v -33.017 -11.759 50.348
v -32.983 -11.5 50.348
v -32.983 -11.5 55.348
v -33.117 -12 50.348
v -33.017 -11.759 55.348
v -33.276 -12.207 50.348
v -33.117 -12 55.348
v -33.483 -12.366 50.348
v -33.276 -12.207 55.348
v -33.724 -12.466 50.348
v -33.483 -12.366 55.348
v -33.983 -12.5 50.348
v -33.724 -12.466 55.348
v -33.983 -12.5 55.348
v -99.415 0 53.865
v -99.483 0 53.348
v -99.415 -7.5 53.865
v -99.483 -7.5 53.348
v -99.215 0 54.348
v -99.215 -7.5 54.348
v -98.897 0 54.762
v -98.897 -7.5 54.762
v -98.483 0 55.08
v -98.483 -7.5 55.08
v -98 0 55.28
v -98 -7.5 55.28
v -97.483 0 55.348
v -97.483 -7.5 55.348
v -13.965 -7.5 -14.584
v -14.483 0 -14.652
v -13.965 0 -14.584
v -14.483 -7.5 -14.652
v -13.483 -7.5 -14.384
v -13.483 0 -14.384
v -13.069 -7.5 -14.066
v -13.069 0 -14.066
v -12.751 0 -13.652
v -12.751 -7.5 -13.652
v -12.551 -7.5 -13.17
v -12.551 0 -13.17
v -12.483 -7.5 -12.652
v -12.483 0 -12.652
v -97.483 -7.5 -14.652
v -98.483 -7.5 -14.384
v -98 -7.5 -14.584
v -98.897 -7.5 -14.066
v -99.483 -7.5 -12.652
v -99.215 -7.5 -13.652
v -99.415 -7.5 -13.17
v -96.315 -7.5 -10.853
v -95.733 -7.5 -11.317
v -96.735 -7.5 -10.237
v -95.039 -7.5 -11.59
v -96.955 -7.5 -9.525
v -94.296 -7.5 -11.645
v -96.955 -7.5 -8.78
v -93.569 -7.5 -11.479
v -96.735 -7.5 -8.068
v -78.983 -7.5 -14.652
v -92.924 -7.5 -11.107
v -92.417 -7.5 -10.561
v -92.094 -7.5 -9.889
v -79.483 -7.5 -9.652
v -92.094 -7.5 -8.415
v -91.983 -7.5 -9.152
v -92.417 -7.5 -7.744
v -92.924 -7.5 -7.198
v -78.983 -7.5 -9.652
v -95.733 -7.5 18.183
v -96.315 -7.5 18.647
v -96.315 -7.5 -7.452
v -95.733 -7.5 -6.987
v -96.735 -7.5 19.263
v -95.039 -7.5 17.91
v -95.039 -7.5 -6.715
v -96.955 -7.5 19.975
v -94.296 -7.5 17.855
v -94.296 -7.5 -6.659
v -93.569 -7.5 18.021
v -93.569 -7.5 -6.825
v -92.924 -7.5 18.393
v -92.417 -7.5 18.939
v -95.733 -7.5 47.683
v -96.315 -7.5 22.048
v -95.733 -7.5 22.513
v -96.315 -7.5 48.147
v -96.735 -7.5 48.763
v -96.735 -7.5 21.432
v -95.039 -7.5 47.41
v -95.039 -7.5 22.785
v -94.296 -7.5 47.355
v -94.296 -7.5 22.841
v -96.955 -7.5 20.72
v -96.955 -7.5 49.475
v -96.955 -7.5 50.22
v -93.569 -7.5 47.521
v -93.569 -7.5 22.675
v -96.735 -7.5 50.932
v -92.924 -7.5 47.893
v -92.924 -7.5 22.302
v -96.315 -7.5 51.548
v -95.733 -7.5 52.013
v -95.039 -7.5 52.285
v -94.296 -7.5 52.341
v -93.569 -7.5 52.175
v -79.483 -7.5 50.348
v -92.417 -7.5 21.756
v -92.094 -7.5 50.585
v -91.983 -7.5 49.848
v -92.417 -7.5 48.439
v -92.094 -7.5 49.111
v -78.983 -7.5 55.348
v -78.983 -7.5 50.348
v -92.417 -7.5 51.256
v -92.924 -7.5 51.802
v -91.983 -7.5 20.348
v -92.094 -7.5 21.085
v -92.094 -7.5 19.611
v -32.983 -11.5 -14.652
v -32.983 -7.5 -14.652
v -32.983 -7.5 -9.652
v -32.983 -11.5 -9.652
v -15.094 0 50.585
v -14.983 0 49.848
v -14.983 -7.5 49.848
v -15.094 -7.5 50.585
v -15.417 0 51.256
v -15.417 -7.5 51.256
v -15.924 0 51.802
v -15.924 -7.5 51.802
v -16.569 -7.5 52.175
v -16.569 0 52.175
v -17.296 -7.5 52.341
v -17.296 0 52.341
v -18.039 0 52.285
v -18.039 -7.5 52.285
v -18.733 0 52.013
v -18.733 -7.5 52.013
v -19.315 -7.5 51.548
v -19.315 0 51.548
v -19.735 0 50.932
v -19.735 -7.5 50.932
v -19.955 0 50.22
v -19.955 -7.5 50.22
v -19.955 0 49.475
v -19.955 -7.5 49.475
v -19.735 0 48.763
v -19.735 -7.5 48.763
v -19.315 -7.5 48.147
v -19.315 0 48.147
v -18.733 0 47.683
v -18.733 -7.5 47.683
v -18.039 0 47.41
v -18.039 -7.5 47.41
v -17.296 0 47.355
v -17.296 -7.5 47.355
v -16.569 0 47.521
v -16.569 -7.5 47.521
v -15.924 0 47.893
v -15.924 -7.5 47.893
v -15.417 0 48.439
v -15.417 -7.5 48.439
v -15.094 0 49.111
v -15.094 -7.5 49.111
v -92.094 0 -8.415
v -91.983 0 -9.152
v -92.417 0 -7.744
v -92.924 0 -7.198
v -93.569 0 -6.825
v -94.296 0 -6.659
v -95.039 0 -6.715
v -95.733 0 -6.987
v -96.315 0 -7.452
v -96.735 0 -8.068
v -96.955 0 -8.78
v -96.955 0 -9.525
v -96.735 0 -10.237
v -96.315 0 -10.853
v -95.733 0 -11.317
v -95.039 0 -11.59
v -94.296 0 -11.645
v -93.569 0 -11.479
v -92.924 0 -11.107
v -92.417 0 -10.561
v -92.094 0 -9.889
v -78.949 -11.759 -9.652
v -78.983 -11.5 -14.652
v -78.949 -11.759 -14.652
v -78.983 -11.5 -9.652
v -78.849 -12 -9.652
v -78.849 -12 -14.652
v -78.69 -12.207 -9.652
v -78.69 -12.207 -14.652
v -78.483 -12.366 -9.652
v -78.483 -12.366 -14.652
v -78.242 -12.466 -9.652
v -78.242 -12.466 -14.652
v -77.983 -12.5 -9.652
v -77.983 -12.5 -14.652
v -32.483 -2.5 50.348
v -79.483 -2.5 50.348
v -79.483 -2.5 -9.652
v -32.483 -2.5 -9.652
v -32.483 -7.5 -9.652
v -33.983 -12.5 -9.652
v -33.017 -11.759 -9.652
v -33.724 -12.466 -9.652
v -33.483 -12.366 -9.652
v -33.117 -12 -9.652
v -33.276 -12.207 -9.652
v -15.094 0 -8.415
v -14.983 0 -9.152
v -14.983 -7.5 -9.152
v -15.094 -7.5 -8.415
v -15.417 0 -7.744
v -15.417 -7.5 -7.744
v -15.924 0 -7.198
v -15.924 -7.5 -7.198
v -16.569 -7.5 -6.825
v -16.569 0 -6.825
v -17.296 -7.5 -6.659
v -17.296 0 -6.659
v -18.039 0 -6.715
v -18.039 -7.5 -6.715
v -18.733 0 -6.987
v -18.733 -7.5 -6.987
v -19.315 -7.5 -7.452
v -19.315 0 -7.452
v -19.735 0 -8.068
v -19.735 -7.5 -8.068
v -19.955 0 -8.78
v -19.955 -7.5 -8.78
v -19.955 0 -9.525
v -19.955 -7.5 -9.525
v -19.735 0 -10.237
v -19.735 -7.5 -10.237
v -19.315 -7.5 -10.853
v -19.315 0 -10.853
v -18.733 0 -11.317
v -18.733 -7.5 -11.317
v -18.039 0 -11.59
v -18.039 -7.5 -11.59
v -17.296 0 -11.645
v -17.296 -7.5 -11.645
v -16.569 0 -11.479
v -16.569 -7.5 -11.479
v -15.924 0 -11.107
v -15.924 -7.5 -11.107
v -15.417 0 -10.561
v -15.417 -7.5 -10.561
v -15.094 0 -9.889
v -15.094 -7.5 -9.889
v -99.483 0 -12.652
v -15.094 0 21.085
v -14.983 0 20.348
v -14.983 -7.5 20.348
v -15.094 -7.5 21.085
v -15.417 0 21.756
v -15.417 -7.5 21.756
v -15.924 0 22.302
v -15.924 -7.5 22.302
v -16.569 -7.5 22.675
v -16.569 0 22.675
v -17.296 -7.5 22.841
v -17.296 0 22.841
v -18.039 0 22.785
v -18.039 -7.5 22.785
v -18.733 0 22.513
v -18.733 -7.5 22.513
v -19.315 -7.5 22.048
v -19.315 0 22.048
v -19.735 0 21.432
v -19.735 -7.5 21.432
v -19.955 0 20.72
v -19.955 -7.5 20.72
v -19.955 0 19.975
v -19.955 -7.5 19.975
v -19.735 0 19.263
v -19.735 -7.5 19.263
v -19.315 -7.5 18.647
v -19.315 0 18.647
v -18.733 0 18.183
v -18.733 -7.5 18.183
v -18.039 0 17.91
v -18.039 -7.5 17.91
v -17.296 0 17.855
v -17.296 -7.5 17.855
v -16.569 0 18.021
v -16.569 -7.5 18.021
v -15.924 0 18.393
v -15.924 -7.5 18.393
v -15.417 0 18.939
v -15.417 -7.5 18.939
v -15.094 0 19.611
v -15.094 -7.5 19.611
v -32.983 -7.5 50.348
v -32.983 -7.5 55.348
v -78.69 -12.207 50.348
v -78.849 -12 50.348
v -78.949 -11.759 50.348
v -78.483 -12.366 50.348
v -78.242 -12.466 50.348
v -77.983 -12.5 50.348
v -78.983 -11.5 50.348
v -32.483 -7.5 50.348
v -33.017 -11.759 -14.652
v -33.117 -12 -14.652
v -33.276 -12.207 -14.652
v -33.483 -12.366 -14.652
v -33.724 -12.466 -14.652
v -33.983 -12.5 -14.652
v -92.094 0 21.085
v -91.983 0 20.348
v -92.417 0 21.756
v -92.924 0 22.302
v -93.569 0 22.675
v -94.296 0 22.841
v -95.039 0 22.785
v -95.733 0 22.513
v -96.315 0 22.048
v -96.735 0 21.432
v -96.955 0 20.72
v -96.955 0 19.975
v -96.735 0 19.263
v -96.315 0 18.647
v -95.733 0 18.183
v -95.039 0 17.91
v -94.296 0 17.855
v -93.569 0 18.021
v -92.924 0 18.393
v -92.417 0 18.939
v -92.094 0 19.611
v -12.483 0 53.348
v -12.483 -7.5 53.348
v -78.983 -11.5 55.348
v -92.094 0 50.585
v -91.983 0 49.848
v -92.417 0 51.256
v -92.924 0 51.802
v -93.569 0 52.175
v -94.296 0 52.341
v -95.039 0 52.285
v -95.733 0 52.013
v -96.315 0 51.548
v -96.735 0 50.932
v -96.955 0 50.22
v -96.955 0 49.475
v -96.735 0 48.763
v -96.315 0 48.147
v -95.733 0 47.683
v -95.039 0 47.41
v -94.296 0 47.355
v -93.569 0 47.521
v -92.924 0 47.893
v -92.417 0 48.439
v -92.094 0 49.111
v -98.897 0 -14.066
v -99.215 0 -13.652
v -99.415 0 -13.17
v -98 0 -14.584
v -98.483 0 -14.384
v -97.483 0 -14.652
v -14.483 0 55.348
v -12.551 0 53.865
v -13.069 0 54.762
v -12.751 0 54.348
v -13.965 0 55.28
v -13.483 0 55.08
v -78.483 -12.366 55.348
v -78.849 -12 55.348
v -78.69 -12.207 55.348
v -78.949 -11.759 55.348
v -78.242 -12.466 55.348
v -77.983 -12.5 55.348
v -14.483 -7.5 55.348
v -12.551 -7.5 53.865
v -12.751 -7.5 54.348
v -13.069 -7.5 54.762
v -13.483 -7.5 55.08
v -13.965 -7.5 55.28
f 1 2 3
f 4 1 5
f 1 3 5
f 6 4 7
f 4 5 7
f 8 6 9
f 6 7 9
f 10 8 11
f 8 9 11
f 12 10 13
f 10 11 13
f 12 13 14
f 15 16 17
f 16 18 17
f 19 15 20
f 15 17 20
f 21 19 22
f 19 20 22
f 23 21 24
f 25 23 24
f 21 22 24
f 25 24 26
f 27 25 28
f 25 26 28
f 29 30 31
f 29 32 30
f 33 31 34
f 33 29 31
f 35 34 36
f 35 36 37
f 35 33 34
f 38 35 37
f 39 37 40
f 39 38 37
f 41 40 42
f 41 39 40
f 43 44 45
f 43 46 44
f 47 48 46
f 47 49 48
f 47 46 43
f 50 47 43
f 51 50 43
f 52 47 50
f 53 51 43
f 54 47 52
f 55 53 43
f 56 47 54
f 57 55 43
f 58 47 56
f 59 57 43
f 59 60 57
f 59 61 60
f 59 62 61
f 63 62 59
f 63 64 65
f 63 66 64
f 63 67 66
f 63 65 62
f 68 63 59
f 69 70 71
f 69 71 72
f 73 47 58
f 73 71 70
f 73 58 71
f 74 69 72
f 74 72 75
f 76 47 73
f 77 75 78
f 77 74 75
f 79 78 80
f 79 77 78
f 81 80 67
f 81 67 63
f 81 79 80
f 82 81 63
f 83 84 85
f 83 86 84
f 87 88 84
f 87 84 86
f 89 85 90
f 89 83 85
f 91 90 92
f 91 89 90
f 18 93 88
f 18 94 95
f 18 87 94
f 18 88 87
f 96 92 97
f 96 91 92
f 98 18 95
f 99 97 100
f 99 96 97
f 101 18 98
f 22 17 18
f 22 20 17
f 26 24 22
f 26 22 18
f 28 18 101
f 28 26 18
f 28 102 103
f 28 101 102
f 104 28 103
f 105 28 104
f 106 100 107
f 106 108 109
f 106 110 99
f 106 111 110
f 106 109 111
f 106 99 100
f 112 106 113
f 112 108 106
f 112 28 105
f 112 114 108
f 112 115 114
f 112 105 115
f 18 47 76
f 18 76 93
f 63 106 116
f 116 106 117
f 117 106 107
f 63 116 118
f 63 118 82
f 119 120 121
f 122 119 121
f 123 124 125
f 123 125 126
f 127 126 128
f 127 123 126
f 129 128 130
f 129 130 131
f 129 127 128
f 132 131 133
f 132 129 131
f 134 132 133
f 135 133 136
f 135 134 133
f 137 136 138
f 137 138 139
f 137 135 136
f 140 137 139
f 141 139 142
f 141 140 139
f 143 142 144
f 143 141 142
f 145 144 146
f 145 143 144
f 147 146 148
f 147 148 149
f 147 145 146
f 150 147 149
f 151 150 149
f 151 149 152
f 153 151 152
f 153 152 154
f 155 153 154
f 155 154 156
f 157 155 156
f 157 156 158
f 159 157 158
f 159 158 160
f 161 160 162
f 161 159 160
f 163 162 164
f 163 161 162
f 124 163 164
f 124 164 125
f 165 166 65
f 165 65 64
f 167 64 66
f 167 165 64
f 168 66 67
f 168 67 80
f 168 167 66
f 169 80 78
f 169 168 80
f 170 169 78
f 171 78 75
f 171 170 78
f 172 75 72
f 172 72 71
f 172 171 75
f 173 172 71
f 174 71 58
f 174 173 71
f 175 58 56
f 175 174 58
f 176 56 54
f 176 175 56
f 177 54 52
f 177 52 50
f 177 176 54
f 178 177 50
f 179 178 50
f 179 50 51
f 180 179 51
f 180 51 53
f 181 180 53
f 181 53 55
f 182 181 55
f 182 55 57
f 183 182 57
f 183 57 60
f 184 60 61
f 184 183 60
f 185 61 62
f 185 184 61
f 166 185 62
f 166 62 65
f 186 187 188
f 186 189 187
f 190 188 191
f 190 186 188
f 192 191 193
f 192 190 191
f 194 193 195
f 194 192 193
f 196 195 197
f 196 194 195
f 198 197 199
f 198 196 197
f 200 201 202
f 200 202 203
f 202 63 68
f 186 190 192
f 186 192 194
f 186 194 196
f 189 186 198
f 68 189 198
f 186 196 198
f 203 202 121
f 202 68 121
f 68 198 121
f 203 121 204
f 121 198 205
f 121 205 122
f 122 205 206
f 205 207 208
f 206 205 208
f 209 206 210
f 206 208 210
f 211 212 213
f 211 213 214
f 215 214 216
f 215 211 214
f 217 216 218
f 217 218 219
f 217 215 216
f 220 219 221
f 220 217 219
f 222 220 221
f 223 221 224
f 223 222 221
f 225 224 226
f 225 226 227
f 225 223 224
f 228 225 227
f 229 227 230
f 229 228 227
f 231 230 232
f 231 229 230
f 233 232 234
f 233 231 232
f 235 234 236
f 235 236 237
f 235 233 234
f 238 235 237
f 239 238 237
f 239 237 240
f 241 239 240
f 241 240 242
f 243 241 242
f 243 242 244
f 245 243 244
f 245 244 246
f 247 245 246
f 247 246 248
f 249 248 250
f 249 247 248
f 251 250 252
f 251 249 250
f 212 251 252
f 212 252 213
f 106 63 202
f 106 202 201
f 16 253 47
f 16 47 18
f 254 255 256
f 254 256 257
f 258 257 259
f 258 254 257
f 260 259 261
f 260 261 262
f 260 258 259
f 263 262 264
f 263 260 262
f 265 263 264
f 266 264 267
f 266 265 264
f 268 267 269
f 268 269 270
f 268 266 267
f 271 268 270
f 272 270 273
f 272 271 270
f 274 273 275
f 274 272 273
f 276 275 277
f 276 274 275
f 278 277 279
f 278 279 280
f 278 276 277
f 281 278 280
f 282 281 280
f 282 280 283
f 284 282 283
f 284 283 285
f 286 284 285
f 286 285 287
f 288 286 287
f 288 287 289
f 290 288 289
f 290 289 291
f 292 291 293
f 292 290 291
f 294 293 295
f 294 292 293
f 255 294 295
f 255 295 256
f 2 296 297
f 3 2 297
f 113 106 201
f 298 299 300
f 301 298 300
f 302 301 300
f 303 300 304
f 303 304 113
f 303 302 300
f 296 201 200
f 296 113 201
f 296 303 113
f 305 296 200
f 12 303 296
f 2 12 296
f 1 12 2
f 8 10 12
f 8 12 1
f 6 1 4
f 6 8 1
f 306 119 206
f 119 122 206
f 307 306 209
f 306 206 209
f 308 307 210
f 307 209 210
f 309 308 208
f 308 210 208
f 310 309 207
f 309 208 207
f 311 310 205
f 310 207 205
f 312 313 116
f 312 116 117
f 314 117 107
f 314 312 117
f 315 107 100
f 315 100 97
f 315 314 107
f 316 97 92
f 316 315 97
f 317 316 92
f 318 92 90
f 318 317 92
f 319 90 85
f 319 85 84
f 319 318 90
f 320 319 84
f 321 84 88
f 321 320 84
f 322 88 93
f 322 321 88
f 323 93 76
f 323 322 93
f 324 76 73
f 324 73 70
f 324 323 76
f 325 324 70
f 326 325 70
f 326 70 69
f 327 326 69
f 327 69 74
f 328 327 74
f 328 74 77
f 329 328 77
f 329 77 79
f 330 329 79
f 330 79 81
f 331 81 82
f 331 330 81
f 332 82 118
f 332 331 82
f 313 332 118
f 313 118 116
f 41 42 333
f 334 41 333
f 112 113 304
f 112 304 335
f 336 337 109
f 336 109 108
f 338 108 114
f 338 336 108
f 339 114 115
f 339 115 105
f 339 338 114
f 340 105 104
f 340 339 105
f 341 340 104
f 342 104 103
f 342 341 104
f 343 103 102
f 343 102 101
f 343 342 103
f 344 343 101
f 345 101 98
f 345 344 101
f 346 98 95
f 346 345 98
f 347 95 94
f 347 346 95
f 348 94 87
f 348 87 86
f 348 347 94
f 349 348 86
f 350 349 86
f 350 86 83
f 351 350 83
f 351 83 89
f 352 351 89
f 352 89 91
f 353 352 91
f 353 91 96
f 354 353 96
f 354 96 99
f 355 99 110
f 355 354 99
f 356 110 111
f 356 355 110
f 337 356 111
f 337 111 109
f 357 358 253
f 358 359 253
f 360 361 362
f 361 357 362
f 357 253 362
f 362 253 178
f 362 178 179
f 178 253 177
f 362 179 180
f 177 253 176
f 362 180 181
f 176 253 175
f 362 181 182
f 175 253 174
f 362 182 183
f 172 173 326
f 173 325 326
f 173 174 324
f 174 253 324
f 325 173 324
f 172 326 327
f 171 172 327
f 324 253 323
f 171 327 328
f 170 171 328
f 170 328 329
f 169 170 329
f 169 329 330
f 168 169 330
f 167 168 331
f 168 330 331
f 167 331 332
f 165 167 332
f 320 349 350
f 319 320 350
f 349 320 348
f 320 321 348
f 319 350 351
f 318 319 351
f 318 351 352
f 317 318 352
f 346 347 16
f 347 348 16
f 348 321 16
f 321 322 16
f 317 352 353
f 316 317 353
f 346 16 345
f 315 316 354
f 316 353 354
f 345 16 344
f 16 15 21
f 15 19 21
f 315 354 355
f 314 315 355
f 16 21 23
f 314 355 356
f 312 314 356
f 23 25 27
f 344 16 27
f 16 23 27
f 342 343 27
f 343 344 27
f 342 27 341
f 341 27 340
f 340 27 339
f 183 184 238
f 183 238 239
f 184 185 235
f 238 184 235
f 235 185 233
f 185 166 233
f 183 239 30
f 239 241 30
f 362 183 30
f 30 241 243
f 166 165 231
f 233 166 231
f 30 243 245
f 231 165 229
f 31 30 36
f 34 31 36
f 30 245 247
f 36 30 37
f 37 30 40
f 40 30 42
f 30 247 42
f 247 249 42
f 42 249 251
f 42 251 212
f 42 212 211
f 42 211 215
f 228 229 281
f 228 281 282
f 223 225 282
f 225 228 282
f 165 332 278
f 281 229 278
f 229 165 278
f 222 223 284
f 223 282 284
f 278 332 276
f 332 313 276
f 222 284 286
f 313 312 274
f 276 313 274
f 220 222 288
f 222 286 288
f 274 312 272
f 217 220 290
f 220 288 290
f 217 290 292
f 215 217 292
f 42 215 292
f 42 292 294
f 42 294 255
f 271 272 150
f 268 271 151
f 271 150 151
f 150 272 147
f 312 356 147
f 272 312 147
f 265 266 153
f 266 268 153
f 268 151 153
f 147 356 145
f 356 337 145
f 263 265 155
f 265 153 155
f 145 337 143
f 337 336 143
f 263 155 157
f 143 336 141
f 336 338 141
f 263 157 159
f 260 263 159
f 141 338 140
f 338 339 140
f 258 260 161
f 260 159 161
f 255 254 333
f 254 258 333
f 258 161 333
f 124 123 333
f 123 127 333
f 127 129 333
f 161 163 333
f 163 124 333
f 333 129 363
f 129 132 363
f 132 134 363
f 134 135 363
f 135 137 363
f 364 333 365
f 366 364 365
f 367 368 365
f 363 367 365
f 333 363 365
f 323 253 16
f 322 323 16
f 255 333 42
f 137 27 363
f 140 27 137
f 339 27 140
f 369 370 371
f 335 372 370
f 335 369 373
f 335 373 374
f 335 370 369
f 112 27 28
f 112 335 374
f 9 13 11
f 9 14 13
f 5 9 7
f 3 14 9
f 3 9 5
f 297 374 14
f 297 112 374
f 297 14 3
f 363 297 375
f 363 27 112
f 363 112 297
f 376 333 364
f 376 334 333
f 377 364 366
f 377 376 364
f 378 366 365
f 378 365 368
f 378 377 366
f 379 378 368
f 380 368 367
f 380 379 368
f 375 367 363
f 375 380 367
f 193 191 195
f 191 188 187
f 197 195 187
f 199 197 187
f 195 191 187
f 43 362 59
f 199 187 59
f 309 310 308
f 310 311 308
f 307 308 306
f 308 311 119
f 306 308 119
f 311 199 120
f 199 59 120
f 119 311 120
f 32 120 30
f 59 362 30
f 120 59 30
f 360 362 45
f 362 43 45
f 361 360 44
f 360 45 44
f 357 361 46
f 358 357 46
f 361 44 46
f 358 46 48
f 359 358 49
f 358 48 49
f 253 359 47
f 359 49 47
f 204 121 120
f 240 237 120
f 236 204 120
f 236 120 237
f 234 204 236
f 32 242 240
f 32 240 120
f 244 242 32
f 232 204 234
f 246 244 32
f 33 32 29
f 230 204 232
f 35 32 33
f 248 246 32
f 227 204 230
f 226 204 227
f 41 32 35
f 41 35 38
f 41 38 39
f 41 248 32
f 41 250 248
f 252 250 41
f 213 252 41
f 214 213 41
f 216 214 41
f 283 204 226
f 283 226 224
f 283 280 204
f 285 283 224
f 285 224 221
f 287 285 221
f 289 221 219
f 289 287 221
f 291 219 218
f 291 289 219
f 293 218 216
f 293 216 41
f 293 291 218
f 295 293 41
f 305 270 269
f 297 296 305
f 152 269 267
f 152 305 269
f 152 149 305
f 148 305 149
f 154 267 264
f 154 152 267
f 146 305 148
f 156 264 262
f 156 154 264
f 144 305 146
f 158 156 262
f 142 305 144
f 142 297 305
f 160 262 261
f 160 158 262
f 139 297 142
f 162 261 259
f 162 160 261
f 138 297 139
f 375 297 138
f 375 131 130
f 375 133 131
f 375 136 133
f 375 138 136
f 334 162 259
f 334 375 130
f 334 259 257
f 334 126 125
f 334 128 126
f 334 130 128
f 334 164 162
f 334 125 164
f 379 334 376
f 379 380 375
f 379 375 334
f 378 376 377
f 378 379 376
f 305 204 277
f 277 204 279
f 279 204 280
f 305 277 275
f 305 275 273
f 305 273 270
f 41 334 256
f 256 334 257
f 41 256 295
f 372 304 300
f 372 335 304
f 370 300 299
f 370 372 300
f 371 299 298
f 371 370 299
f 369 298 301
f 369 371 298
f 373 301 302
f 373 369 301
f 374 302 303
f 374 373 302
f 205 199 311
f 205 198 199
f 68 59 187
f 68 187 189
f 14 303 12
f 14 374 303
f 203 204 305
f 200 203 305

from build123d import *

# Parameters (mm, degrees)
F0_W     = 87
F0_H     = 70
F0_R     = 2.5
F1_DEPTH = 7.5
F2_W     = 47
F2_H     = 60
F3_DEPTH = 5
F4_W     = 46
F4_H     = 5
F5_DEPTH = 5
F6_R     = 1
F7_R     = 2


with BuildPart() as f1:
    # F0 (on Front) → F1 (new body)
    with BuildSketch(Plane.XZ):
        with Locations((-55.98273, 20.347756)):
            Rectangle(F0_W, F0_H)
        with Locations((-94.48273, -9.152244)):
            Circle(F0_R, mode=Mode.SUBTRACT)
        with Locations((-17.48273, -9.152244)):
            Circle(F0_R, mode=Mode.SUBTRACT)
        with Locations((-94.48273, 20.347756)):
            Circle(F0_R, mode=Mode.SUBTRACT)
        with Locations((-94.48273, 49.847756)):
            Circle(F0_R, mode=Mode.SUBTRACT)
        with Locations((-17.48273, 20.347756)):
            Circle(F0_R, mode=Mode.SUBTRACT)
        with Locations((-17.48273, 49.847756)):
            Circle(F0_R, mode=Mode.SUBTRACT)
    extrude(amount=F1_DEPTH)

    # F2 (on face) → F3 (cut)
    with BuildSketch(Plane.XZ.offset(7.5)):
        with Locations((-55.98273, 20.347756)):
            Rectangle(F2_W, F2_H)
    extrude(amount=-F3_DEPTH, mode=Mode.SUBTRACT)

    # F4 (on face) → F5 (join)
    with BuildSketch(Plane.XZ.offset(7.5)):
        with Locations((-55.98273, 52.847756)):
            Rectangle(F4_W, F4_H)
        with Locations((-55.98273, -12.152244)):
            Rectangle(F4_W, F4_H)
    extrude(amount=F5_DEPTH)

    # F6
    f6_edges = [f1.edges().sort_by_distance(p)[0] for p in [
        (-78.98273, -12.5, 52.847756),
        (-32.98273, -12.5, 52.847756),
        (-32.98273, -12.5, -12.152244),
        (-78.98273, -12.5, -12.152244),
    ]]
    fillet(f6_edges, radius=F6_R)

    # F7
    f7_edges = [f1.edges().sort_by_distance(p)[0] for p in [
        (-99.48273, -3.75, -14.652244),
        (-12.48273, -3.75, -14.652244),
        (-12.48273, -3.75, 55.347756),
        (-99.48273, -3.75, 55.347756),
    ]]
    fillet(f7_edges, radius=F7_R)


solid = f1.part
